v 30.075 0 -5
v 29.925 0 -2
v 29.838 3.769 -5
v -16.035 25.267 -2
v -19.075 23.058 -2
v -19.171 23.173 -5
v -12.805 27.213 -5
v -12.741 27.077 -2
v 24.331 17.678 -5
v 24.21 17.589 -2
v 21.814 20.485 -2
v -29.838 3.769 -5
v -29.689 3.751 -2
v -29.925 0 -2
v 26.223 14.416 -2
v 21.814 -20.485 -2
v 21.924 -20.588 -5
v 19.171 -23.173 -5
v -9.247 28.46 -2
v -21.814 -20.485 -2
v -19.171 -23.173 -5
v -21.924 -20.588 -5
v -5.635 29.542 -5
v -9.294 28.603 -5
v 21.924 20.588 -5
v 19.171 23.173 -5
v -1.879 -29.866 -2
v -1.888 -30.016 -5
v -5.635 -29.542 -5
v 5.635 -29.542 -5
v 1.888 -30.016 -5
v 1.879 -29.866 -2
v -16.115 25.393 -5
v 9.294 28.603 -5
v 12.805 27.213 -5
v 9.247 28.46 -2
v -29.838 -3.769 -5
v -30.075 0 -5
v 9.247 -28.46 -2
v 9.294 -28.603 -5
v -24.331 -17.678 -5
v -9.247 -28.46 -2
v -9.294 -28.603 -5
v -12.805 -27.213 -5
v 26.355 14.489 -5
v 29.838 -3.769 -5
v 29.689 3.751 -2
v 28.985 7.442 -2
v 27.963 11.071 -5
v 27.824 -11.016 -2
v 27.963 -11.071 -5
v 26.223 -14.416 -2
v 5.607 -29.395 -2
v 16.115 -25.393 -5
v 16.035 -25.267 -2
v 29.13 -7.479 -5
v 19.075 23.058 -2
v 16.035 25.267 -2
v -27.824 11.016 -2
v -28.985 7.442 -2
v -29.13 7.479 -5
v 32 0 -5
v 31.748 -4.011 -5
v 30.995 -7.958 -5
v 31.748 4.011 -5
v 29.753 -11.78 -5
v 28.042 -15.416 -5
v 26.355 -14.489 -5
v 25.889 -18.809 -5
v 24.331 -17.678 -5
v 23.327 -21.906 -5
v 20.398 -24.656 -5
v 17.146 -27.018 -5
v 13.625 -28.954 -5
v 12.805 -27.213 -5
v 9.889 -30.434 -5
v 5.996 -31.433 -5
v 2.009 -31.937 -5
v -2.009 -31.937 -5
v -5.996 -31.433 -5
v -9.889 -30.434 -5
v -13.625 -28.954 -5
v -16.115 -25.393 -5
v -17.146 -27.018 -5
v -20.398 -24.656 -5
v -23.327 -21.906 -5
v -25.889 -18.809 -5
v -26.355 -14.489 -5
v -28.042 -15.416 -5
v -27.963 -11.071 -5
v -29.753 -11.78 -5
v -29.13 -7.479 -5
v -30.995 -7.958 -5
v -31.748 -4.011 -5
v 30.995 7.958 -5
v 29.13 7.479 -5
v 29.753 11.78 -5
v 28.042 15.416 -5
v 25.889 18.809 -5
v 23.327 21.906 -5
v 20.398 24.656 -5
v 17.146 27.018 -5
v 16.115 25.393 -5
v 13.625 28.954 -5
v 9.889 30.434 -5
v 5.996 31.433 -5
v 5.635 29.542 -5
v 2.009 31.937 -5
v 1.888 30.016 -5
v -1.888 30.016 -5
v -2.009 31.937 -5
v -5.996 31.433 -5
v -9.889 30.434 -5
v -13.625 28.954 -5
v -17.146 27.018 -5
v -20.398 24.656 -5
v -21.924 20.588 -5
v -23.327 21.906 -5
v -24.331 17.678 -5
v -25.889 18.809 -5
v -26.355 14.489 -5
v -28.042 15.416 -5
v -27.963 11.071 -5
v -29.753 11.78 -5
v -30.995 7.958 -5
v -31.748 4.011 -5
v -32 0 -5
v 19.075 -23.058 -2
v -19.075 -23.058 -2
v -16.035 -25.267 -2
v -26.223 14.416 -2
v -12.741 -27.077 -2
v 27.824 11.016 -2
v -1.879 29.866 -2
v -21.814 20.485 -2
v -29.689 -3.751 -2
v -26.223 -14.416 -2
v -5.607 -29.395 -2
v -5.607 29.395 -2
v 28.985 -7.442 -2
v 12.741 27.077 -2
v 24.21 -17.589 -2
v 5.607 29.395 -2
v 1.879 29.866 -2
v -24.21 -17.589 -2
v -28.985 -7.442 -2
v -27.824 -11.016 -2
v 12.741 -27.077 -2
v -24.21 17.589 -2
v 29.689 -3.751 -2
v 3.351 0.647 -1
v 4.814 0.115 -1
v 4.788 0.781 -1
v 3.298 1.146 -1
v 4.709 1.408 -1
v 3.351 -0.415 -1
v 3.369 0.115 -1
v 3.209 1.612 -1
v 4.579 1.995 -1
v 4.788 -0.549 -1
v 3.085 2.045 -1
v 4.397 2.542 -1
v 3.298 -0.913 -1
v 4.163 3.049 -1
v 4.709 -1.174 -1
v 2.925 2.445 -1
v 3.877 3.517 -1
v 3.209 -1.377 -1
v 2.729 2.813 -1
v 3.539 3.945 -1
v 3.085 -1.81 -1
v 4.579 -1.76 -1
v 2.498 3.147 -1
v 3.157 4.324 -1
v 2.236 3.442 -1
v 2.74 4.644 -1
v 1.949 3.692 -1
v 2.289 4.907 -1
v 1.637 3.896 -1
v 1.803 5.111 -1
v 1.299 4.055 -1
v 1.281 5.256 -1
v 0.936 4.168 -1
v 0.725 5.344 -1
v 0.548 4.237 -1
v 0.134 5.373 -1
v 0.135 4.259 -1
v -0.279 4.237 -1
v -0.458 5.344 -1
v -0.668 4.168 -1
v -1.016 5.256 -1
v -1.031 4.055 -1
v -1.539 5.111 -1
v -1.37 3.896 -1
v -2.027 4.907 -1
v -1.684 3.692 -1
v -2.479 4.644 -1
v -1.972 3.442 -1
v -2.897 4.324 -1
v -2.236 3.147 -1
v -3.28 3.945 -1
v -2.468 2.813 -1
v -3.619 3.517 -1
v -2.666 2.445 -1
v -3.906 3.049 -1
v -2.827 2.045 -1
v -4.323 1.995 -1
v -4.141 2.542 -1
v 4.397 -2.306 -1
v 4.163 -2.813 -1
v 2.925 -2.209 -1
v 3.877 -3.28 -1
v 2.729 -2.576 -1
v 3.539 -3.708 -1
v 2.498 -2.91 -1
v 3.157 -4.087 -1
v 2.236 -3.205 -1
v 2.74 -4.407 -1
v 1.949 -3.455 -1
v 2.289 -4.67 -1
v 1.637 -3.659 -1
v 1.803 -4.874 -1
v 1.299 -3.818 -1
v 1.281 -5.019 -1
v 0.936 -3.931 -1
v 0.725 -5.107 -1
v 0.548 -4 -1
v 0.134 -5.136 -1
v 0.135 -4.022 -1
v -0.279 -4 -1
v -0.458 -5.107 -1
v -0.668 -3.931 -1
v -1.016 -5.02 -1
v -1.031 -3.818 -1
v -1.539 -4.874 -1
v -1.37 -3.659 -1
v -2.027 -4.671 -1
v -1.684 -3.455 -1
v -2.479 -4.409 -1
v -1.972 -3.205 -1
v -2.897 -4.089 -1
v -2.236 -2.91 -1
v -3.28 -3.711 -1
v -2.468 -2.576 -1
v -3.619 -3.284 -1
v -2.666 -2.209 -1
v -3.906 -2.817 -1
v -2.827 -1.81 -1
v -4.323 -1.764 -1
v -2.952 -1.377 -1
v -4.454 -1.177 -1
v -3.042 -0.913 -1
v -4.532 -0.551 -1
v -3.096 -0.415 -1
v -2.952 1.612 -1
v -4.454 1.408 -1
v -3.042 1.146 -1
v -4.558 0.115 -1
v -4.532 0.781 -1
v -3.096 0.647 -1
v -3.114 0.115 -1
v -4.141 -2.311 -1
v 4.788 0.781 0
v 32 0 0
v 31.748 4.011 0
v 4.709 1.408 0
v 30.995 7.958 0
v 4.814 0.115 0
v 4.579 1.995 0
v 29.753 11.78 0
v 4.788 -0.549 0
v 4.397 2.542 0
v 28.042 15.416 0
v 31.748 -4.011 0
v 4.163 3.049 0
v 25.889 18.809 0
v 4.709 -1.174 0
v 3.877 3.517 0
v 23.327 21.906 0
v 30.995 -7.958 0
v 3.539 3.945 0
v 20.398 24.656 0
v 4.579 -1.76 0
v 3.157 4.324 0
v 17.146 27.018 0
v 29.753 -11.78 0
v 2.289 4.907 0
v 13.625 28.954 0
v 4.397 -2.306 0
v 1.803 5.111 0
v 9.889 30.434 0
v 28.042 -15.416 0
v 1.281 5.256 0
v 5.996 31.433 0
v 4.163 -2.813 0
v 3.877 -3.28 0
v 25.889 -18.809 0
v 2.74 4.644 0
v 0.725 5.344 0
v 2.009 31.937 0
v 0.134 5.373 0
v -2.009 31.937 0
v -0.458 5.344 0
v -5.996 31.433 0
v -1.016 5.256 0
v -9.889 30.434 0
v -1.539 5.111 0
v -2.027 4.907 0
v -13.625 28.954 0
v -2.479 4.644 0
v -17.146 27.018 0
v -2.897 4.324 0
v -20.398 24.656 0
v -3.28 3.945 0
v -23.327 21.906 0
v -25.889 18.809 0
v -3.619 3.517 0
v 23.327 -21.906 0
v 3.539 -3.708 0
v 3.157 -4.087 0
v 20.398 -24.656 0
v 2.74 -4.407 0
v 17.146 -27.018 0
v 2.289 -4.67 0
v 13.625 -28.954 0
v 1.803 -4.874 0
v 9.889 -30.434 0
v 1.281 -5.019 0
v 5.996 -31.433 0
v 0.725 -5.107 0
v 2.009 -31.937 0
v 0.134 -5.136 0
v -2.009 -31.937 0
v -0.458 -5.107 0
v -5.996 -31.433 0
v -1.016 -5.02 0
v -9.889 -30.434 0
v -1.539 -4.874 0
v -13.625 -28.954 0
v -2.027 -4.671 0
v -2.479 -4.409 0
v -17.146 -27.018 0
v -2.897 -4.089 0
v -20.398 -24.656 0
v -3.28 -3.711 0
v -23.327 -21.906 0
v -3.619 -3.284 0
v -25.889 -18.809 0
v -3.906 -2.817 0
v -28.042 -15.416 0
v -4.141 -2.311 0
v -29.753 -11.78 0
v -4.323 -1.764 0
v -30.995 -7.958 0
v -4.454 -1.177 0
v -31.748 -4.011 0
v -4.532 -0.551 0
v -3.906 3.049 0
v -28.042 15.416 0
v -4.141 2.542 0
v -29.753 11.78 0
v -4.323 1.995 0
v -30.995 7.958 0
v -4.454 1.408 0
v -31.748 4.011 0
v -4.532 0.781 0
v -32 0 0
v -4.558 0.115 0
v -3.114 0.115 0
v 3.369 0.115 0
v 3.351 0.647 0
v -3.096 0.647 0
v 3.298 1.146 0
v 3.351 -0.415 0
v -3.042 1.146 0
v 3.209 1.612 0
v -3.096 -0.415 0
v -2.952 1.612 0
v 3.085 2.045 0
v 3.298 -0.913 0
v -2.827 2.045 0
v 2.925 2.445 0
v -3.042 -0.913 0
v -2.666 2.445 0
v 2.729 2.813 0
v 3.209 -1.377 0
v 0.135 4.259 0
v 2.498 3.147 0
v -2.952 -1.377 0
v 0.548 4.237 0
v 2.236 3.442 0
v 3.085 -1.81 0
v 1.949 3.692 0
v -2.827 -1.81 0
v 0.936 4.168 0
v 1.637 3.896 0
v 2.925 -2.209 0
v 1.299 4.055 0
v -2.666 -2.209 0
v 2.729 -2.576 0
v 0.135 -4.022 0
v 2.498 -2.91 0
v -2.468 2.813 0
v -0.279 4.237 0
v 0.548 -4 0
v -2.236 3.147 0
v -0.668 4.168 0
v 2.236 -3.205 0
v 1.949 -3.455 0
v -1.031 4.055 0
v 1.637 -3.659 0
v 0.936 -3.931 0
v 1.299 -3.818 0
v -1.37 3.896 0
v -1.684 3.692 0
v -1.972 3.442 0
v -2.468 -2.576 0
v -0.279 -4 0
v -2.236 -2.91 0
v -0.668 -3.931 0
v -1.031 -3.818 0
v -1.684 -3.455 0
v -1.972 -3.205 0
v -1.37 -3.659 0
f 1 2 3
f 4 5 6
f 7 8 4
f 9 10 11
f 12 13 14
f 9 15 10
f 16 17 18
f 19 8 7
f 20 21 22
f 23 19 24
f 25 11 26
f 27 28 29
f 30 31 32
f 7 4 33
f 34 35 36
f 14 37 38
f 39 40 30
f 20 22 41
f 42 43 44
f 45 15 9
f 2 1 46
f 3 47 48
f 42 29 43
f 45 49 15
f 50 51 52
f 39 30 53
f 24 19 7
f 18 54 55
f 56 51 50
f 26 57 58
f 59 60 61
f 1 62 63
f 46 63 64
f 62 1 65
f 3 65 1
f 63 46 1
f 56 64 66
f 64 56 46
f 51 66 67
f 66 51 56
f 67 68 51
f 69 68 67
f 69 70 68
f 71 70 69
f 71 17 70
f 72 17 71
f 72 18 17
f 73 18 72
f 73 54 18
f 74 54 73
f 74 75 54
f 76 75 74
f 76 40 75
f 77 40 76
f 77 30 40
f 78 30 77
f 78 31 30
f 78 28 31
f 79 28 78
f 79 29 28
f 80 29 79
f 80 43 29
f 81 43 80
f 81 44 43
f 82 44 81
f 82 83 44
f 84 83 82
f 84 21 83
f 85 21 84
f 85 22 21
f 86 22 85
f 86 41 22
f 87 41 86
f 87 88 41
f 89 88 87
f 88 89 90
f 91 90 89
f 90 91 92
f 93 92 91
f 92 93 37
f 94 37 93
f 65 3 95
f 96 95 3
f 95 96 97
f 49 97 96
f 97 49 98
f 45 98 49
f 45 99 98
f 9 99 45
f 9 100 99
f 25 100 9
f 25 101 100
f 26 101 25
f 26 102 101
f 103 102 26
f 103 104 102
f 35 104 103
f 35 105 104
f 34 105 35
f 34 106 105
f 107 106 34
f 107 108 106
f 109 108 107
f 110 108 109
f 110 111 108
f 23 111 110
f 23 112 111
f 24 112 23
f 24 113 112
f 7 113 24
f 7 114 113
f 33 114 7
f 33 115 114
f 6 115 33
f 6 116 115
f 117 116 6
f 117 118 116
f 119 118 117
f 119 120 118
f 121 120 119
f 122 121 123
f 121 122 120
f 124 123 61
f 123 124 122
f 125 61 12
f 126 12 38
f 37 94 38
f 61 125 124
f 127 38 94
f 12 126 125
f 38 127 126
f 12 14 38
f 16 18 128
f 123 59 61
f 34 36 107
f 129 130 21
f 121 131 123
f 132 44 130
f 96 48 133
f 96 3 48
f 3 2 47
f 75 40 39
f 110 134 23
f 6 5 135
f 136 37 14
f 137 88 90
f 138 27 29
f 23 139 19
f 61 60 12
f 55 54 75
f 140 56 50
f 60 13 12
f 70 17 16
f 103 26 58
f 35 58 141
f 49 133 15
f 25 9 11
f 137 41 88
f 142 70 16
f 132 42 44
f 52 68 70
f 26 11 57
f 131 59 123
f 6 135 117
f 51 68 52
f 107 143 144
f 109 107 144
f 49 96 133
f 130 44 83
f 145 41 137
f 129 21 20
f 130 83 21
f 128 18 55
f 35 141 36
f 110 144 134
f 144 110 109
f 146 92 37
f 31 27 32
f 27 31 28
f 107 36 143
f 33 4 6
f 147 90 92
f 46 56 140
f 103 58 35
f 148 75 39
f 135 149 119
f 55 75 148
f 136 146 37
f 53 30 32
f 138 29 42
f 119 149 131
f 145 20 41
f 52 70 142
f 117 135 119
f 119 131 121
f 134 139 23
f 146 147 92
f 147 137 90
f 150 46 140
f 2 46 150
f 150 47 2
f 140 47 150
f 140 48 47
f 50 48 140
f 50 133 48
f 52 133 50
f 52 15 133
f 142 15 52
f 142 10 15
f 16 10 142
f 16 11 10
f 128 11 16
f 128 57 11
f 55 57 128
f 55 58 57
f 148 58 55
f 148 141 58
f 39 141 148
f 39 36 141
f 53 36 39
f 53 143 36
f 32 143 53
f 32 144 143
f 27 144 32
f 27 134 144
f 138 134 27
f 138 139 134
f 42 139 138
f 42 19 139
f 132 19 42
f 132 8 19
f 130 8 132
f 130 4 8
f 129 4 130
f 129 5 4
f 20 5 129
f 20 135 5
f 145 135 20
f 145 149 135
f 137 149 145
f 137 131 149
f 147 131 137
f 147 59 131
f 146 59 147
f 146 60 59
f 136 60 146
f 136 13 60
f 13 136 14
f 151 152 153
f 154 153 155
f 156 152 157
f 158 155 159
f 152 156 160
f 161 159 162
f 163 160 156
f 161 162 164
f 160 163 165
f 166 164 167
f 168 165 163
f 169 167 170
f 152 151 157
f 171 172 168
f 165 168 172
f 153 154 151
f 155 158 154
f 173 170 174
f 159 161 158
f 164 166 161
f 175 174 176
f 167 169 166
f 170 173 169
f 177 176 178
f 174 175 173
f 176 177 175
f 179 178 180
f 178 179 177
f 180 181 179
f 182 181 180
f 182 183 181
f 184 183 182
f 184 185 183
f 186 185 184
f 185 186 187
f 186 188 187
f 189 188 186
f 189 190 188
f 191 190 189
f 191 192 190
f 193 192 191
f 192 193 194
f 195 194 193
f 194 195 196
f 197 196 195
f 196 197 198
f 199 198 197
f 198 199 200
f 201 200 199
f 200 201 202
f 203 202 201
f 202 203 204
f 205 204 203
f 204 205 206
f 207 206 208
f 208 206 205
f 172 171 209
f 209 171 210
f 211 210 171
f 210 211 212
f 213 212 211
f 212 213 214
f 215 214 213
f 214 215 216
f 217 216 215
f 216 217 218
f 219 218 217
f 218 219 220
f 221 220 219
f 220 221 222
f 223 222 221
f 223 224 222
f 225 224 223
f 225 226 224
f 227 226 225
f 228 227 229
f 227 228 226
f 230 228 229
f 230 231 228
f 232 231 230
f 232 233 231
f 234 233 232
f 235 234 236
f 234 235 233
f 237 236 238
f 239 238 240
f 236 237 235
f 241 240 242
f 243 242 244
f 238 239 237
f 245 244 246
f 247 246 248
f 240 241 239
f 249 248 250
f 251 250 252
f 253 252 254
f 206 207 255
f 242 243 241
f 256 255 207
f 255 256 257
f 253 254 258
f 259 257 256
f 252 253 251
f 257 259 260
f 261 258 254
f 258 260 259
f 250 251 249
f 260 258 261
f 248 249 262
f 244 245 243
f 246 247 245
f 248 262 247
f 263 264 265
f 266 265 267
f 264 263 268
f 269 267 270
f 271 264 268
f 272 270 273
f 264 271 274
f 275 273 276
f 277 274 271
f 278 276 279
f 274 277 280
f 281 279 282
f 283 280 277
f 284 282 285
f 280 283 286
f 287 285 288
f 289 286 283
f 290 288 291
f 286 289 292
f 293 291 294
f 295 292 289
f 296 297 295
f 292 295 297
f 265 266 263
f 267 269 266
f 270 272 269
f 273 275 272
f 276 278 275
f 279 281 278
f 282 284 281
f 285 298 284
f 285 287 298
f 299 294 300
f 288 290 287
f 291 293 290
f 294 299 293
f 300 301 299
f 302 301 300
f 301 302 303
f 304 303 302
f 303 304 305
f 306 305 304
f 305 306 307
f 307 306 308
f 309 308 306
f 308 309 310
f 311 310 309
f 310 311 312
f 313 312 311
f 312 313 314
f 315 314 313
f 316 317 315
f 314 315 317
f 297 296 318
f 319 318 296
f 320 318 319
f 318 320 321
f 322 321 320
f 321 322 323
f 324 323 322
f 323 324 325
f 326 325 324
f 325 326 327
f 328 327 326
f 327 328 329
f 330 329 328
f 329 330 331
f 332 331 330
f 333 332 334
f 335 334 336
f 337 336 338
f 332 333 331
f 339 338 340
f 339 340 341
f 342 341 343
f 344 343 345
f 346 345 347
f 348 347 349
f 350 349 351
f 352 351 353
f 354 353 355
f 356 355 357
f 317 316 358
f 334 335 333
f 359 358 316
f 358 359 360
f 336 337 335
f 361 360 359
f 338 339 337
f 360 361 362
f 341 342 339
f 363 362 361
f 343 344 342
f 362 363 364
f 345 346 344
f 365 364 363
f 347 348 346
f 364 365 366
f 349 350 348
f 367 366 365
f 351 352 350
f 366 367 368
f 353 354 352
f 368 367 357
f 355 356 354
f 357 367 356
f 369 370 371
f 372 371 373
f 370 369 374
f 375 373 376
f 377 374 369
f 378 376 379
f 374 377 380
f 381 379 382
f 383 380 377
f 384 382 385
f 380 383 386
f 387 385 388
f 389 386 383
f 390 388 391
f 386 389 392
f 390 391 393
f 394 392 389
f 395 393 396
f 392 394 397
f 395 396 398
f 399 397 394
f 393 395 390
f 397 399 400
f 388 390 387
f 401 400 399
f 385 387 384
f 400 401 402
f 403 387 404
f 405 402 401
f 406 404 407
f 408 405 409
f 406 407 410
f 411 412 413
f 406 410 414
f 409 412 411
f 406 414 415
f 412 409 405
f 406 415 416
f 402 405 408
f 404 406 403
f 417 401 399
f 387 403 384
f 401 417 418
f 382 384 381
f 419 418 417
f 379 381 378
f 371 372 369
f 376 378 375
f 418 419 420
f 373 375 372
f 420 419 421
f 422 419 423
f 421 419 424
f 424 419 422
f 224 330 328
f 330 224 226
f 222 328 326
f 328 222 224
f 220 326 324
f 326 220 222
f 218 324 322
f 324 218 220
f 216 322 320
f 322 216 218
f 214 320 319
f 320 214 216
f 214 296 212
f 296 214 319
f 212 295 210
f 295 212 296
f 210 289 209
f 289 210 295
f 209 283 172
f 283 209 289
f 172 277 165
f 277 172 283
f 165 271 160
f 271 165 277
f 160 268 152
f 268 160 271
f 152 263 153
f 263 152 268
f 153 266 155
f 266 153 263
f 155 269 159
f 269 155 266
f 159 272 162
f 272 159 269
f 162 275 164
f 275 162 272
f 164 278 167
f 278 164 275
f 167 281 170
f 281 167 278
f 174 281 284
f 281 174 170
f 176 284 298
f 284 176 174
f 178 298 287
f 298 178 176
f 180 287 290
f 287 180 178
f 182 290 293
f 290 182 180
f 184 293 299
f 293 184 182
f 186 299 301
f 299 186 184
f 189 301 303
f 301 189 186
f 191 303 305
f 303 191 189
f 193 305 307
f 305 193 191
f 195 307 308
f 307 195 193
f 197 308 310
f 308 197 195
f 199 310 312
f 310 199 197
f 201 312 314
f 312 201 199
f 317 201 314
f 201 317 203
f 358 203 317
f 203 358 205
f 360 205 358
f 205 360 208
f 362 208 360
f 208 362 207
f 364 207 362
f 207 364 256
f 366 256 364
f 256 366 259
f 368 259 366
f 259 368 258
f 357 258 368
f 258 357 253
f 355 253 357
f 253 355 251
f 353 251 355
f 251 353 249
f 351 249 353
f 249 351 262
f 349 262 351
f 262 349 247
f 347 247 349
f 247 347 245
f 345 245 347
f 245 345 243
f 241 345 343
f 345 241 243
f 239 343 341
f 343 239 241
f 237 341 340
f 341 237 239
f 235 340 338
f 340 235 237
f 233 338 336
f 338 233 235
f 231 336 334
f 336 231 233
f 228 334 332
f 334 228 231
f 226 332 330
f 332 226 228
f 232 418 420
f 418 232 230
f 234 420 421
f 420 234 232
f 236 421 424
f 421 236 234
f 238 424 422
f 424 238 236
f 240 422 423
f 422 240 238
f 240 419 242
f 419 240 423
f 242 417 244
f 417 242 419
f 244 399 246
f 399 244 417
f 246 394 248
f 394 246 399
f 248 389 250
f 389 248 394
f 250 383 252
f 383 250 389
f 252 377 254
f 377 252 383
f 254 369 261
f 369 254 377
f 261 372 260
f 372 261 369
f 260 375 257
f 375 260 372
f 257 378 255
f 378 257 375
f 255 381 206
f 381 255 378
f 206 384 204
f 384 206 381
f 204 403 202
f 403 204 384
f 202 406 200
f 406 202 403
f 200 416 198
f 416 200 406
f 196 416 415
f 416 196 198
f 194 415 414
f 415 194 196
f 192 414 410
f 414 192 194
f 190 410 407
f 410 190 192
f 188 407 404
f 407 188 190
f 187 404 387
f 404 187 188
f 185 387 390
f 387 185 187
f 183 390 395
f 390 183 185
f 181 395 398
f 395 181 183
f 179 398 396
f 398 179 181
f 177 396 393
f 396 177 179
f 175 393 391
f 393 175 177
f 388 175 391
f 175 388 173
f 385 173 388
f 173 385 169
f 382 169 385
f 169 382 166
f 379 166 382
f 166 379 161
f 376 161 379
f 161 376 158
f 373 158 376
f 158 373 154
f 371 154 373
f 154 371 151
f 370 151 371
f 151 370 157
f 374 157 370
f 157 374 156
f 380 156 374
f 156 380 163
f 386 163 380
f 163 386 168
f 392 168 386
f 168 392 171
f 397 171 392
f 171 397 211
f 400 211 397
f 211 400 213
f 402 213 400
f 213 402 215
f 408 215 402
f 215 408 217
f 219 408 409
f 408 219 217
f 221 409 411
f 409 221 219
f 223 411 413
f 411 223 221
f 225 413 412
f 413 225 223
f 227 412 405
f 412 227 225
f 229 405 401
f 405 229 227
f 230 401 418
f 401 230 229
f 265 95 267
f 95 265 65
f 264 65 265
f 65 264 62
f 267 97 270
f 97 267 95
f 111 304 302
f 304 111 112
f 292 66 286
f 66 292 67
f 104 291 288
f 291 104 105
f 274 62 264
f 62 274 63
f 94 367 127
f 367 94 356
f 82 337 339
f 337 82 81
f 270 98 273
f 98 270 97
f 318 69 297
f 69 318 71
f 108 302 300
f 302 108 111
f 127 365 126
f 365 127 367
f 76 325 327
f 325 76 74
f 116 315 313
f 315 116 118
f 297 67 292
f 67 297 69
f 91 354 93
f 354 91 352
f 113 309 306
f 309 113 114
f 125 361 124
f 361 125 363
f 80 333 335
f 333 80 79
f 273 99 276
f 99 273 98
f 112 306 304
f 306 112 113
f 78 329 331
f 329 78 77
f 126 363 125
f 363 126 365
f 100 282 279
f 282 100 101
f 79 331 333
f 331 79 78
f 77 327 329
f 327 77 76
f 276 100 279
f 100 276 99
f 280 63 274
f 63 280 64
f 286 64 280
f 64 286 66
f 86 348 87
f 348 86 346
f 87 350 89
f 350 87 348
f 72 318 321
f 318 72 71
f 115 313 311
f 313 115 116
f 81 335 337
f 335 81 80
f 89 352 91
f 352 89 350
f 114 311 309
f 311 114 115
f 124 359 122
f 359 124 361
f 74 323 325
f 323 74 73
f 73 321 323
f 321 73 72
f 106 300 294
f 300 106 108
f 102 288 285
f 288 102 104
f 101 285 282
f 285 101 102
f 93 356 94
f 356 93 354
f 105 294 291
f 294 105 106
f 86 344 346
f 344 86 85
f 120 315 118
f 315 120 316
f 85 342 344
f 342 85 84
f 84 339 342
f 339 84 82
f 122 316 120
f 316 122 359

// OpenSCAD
$fn = 50;

difference() {
	union() {
		translate(v = [0, 0, -5.0]) {
			cylinder(h = 5, r = 32.0);
		}
	}
	union() {
		#translate(v = [0, 0, -5.0]) {
			cylinder(h = 3, r1 = 30.075, r2 = 29.925);
		}
		translate(v = [0, 0, -1]) {
			linear_extrude(height = 1) {
				text(font = "Impact", halign = "center", size = 10, text = "O", valign = "center");
			}
		}
	}
}
